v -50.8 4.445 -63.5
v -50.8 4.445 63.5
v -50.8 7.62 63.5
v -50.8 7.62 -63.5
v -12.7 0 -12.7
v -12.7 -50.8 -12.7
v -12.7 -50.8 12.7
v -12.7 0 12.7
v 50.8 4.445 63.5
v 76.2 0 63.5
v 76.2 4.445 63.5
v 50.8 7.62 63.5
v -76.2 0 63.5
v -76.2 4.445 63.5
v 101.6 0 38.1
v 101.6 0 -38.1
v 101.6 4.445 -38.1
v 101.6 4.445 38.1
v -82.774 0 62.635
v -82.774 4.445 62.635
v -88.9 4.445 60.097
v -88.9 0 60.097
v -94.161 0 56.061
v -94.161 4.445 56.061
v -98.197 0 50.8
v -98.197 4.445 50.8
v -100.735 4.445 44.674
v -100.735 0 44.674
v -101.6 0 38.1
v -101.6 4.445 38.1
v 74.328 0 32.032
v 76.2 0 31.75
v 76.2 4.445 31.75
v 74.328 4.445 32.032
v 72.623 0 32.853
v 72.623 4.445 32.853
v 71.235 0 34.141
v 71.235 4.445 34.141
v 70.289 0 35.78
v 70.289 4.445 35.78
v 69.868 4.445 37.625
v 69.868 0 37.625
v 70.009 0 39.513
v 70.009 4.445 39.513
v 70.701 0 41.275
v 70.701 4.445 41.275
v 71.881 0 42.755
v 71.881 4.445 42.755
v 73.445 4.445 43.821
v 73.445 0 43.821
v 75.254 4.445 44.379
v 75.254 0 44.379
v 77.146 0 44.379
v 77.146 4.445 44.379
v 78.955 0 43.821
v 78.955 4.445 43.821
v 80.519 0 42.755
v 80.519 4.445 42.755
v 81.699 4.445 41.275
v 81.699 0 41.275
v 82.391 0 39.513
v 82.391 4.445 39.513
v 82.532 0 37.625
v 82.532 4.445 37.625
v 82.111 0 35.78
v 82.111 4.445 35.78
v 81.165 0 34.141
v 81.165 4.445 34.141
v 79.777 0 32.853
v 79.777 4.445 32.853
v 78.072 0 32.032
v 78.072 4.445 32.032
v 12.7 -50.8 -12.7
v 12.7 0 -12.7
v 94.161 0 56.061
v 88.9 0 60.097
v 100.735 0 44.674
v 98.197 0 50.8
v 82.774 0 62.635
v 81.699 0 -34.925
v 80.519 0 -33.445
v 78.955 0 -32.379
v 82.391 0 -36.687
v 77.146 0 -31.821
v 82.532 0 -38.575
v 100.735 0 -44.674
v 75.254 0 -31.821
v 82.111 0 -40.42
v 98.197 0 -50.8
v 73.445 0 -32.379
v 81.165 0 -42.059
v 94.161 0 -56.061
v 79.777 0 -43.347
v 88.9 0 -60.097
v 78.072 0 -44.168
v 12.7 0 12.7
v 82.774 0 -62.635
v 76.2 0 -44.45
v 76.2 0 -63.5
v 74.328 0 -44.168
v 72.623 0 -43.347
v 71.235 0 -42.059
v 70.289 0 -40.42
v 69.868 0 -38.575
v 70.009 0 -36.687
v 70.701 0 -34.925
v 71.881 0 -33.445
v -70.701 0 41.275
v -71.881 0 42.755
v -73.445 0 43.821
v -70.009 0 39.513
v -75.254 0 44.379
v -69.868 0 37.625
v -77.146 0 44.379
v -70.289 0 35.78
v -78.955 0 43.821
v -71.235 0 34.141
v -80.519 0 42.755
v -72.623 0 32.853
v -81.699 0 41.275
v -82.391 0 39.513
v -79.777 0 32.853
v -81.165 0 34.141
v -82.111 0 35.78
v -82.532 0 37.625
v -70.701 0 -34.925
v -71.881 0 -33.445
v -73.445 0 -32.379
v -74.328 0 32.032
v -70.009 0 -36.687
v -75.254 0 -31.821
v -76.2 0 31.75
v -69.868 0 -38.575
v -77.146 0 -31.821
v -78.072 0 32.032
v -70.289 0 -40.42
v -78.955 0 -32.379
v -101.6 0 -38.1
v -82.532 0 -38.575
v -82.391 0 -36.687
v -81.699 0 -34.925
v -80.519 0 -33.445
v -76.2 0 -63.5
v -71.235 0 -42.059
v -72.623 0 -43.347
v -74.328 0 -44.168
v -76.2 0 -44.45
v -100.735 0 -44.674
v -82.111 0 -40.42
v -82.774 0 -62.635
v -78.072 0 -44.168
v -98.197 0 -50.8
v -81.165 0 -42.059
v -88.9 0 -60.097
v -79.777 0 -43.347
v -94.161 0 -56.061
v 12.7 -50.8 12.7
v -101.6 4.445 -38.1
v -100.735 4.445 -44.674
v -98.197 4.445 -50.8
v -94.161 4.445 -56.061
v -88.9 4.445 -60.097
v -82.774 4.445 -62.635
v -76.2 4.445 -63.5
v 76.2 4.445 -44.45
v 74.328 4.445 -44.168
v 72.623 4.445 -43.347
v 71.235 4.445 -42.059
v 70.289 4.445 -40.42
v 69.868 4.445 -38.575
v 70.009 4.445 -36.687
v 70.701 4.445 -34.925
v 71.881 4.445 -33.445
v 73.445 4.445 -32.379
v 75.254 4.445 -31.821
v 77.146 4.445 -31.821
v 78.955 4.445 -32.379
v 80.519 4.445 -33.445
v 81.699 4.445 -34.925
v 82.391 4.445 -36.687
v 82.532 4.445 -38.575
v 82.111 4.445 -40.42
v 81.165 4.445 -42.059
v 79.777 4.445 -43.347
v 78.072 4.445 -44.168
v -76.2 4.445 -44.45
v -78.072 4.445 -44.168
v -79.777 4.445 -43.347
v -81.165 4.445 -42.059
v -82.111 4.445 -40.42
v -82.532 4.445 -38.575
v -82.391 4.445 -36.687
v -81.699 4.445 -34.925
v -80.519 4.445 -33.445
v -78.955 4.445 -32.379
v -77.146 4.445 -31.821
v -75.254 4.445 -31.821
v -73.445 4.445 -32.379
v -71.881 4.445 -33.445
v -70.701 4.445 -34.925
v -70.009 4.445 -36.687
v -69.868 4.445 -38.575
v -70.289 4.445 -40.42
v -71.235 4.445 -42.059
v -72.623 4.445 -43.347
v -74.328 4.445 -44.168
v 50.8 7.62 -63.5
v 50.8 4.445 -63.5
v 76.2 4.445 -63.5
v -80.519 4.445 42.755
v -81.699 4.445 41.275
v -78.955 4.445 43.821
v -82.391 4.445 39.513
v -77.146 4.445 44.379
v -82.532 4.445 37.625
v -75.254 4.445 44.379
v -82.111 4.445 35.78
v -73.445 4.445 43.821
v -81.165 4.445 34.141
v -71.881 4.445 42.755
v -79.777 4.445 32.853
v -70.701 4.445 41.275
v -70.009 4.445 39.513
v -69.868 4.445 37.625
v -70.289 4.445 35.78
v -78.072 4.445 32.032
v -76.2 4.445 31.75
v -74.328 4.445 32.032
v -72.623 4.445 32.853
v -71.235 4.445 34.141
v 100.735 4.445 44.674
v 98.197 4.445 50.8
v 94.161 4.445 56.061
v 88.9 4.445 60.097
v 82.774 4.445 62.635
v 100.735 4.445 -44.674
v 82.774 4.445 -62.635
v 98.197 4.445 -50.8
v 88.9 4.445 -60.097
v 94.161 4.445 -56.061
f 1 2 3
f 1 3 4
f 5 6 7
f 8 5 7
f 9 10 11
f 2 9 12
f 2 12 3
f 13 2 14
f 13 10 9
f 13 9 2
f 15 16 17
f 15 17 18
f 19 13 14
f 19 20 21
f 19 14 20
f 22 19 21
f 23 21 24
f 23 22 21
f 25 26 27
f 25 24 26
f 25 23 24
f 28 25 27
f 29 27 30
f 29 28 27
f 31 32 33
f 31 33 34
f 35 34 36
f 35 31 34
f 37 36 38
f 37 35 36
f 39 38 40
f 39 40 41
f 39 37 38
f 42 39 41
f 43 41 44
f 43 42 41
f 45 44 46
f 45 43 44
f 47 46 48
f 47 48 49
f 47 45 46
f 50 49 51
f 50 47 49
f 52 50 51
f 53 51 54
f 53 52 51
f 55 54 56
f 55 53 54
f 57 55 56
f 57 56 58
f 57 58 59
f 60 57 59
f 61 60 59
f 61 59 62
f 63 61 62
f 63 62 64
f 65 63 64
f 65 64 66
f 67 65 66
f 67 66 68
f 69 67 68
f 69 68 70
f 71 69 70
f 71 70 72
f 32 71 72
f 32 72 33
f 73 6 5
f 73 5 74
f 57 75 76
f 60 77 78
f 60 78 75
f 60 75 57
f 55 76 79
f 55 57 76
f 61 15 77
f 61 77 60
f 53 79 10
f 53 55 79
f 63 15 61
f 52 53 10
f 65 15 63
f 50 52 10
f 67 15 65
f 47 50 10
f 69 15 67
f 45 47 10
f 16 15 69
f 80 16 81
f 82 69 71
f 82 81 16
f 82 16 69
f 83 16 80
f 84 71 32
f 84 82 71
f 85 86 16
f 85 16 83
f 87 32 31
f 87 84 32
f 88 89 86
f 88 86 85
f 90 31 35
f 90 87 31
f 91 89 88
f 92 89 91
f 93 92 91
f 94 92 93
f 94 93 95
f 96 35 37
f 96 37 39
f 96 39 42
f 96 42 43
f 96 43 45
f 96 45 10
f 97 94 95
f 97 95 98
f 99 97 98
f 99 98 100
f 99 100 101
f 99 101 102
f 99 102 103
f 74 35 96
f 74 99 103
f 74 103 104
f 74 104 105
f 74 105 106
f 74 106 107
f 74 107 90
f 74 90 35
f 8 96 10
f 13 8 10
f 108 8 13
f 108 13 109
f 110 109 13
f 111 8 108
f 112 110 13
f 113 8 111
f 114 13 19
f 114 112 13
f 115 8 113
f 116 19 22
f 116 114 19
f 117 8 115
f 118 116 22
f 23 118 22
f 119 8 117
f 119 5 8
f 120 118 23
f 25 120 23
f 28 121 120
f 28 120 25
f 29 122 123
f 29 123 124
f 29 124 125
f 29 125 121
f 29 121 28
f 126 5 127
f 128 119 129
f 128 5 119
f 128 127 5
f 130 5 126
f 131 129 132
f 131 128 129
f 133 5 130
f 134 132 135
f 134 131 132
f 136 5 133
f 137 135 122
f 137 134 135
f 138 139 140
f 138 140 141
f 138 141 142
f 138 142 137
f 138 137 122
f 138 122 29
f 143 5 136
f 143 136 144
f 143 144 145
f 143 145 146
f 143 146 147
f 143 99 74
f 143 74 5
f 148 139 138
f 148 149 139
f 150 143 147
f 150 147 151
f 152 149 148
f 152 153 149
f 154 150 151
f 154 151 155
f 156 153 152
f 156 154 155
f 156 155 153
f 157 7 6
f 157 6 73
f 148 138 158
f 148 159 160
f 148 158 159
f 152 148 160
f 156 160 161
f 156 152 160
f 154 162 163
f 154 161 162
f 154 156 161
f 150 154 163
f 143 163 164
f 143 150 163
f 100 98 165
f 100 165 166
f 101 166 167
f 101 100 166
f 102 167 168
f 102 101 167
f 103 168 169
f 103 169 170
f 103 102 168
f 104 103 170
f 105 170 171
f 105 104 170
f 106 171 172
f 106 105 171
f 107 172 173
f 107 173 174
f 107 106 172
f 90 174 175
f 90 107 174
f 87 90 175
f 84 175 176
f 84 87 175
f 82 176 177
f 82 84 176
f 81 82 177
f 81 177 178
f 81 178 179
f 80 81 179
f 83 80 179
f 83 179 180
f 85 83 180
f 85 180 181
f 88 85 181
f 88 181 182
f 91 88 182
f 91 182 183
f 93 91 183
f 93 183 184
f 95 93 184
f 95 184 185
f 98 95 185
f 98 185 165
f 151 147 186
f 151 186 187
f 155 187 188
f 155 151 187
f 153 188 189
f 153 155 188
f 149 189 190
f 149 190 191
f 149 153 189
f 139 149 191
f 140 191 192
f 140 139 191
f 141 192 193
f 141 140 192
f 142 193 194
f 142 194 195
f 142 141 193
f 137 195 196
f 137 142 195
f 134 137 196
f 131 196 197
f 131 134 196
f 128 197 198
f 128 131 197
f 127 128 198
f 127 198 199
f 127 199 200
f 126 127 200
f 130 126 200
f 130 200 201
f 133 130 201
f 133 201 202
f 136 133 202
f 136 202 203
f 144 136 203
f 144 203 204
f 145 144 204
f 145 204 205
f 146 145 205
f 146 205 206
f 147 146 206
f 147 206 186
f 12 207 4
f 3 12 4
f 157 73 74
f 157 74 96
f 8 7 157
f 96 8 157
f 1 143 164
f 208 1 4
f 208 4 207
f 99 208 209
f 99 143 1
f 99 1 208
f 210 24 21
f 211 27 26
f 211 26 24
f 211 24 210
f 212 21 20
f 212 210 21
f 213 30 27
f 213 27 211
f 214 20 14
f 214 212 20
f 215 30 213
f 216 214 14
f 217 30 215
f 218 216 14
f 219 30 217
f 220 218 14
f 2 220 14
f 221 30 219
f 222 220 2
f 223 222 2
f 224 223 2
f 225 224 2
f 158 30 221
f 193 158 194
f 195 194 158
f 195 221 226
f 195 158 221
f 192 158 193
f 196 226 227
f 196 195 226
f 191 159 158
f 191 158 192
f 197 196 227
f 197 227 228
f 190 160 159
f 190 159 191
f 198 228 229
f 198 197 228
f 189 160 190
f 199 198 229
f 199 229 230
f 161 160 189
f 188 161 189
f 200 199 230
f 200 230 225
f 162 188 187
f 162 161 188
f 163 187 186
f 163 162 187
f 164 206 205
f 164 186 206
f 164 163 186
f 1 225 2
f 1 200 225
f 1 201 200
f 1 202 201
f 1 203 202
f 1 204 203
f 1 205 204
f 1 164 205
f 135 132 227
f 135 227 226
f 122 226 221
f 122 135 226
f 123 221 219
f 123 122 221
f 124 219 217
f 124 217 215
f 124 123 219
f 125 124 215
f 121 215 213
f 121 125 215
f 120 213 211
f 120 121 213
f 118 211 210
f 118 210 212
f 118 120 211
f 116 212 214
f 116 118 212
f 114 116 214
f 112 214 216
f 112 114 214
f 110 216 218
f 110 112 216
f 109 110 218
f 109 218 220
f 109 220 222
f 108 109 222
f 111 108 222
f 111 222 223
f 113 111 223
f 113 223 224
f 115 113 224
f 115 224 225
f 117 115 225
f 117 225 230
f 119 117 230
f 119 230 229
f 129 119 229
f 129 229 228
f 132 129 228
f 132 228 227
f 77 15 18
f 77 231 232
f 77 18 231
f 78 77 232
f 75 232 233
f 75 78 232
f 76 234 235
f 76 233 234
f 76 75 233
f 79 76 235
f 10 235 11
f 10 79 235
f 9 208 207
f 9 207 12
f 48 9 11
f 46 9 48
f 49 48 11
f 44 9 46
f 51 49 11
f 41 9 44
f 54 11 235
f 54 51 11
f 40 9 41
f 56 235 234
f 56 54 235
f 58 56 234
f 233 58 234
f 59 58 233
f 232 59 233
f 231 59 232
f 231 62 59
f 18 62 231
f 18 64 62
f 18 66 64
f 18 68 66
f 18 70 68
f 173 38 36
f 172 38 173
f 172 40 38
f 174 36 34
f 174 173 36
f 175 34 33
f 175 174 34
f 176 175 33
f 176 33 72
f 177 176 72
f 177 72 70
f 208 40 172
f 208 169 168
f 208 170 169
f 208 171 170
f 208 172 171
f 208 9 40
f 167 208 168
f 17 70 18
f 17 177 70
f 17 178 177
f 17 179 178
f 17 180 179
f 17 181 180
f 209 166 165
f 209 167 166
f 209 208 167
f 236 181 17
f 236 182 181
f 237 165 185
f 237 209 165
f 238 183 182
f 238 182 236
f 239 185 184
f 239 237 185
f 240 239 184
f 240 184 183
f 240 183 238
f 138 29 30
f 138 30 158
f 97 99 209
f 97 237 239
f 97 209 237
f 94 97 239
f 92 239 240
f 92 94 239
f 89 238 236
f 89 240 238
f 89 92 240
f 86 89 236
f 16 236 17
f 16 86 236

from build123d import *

# Parameters (mm, degrees)
SKETCH1_R           = 6.35
BOSS_EXTRUDE2_DEPTH = 7.62
CUT_EXTRUDE2_START  = -3.175
SKETCH3_R           = 6.35
CUT_EXTRUDE2_DEPTH  = 3.175
SKETCH4_W           = 25.4
SKETCH4_H           = 25.4
BOSS_EXTRUDE3_DEPTH = 50.8


with BuildPart() as part:
    # Sketch1 → Boss-Extrude2 (new body)
    with BuildSketch(Plane(origin=(0, 0, 0), x_dir=(1, 0, 0), z_dir=(0, 1, 0))):
        with BuildLine():
            Line((-76.2, 63.5), (76.2, 63.5))
            ThreePointArc((76.2, 63.5), (94.160512242, 56.060512242), (101.6, 38.1))
            Line((101.6, 38.1), (101.6, -38.1))
            ThreePointArc((101.6, -38.1), (94.160512242, -56.060512242), (76.2, -63.5))
            Line((76.2, -63.5), (-76.2, -63.5))
            ThreePointArc((-76.2, -63.5), (-94.160512242, -56.060512242), (-101.6, -38.1))
            Line((-101.6, -38.1), (-101.6, 38.1))
            ThreePointArc((-101.6, 38.1), (-94.160512242, 56.060512242), (-76.2, 63.5))
        make_face()
        with Locations(Location((-76.2, 38.1, 0), (0, 0, 90))):
            Circle(SKETCH1_R, mode=Mode.SUBTRACT)
        with Locations(Location((76.2, -38.1, 0), (0, 0, 90))):
            Circle(SKETCH1_R, mode=Mode.SUBTRACT)
        with Locations(Location((76.2, 38.1, 0), (0, 0, 90))):
            Circle(SKETCH1_R, mode=Mode.SUBTRACT)
        with Locations(Location((-76.2, -38.1, 0), (0, 0, 90))):
            Circle(SKETCH1_R, mode=Mode.SUBTRACT)
    extrude(amount=BOSS_EXTRUDE2_DEPTH)

    # Sketch3 → Cut-Extrude2 (cut)
    # profile 1 of 2: a face of its own
    with BuildSketch(Plane(origin=(0, 7.62, 0), x_dir=(1, 0, 0), z_dir=(0, 1, 0)).offset(CUT_EXTRUDE2_START)):
        with BuildLine():
            Line((-50.8, -63.5), (-50.8, 63.5))
            Line((-50.8, 63.5), (-76.2, 63.5))
            ThreePointArc((-76.2, 63.5), (-94.160512242, 56.060512242), (-101.6, 38.1))
            Line((-101.6, 38.1), (-101.6, -38.1))
            ThreePointArc((-101.6, -38.1), (-94.160512242, -56.060512242), (-76.2, -63.5))
            Line((-76.2, -63.5), (-50.8, -63.5))
        make_face()
        with Locations(Location((-76.2, -38.1, 0), (0, 0, 90))):
            Circle(SKETCH3_R, mode=Mode.SUBTRACT)
        with Locations(Location((-76.2, 38.1, 0), (0, 0, 90))):
            Circle(SKETCH3_R, mode=Mode.SUBTRACT)
    # profile 2 of 2: a face of its own
    with BuildSketch(Plane(origin=(0, 7.62, 0), x_dir=(1, 0, 0), z_dir=(0, 1, 0)).offset(CUT_EXTRUDE2_START)):
        with BuildLine():
            Line((76.2, 63.5), (50.8, 63.5))
            Line((50.8, 63.5), (50.8, -63.5))
            Line((50.8, -63.5), (76.2, -63.5))
            ThreePointArc((76.2, -63.5), (94.160512242, -56.060512242), (101.6, -38.1))
            Line((101.6, -38.1), (101.6, 38.1))
            ThreePointArc((101.6, 38.1), (94.160512242, 56.060512242), (76.2, 63.5))
        make_face()
        with Locations(Location((76.2, -38.1, 0), (0, 0, 90))):
            Circle(SKETCH3_R, mode=Mode.SUBTRACT)
        with Locations(Location((76.2, 38.1, 0), (0, 0, 90))):
            Circle(SKETCH3_R, mode=Mode.SUBTRACT)
    extrude(amount=CUT_EXTRUDE2_DEPTH, mode=Mode.SUBTRACT)

    # Sketch4 → Boss-Extrude3 (add)
    with BuildSketch(Plane.XZ):
        Rectangle(SKETCH4_W, SKETCH4_H)
    extrude(amount=BOSS_EXTRUDE3_DEPTH)


solid = part.part
